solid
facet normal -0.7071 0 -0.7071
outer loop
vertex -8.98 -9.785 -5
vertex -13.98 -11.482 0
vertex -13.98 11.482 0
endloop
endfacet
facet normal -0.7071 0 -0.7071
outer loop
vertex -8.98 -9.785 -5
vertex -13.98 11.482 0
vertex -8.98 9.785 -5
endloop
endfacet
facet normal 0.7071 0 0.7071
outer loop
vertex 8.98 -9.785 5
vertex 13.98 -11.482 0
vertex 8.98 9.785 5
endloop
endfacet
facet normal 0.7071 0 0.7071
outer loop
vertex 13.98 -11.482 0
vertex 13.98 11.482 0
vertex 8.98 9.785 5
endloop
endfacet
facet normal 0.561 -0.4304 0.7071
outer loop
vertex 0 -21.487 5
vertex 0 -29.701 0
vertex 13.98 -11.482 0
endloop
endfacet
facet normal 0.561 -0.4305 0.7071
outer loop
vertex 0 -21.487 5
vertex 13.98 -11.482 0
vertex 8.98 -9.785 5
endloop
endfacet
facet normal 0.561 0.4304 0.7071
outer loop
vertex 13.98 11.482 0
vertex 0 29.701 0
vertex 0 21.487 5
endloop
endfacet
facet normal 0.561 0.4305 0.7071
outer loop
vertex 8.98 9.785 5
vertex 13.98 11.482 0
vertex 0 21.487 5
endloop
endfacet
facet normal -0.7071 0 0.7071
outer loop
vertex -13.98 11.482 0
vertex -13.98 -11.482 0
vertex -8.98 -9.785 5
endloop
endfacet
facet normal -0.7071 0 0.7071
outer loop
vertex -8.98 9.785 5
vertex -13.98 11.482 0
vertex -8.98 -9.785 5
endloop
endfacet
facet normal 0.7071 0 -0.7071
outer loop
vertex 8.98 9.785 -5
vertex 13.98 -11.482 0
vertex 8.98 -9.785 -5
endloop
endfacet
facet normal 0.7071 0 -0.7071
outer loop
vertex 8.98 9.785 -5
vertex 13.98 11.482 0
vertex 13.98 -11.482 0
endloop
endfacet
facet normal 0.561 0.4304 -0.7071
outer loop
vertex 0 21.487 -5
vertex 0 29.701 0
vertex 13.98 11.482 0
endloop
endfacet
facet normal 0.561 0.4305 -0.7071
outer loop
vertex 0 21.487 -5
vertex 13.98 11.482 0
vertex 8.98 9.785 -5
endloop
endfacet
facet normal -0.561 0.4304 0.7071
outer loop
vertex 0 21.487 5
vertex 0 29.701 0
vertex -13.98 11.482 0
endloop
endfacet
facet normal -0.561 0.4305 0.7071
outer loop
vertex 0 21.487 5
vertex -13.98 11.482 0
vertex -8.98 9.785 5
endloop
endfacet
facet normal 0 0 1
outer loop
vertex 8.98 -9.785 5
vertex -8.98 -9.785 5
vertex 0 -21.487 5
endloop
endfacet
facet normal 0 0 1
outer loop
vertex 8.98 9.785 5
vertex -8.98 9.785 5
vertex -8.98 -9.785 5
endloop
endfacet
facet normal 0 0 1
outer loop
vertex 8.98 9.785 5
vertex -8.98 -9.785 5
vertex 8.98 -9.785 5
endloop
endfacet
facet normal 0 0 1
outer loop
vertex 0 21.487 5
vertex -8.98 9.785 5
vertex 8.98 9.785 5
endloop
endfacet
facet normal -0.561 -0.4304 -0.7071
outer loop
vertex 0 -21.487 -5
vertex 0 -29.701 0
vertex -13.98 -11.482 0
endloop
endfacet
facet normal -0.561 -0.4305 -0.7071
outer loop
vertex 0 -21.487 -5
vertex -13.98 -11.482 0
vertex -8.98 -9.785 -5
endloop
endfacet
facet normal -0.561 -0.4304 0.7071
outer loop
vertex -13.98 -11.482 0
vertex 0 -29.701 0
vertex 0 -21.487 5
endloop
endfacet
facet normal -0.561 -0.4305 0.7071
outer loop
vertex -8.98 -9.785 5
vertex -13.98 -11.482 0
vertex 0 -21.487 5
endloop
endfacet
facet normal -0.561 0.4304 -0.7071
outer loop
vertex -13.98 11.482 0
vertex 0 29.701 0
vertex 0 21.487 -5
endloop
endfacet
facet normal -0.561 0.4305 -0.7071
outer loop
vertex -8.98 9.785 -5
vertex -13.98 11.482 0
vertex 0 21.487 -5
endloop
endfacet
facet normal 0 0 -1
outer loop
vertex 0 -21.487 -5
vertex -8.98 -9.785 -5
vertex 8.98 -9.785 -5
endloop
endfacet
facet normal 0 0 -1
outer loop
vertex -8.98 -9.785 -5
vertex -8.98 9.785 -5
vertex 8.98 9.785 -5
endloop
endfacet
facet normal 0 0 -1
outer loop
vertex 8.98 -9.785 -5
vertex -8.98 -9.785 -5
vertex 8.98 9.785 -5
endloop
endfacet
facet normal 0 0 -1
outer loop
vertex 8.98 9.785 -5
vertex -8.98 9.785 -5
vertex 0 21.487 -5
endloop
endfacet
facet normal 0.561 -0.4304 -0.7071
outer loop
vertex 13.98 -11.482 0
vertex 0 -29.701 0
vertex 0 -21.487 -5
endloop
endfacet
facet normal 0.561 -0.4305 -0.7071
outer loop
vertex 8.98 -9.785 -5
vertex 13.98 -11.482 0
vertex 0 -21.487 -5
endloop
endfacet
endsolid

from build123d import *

# Parameters (mm, degrees)
F1_DEPTH = 5
F1_TAPER = 45


with BuildPart() as f1:
    # F0 (on Top) → F1 (new body)
    with BuildSketch(Plane.XY):
        Polygon((0, 29.7006979173), (-13.9796594971, 11.482050957), (-13.9796594971, -11.482050957), (0, -29.7006979173), (13.9796594971, -11.482050957), (13.9796594971, 11.482050957), align=None)
    extrude(amount=F1_DEPTH, taper=F1_TAPER)

    # F2: F1 across plane


with BuildPart() as f1_1:
    add(f1.part)
    add(f1.part.mirror(Plane.XY))


solid = f1_1.part
